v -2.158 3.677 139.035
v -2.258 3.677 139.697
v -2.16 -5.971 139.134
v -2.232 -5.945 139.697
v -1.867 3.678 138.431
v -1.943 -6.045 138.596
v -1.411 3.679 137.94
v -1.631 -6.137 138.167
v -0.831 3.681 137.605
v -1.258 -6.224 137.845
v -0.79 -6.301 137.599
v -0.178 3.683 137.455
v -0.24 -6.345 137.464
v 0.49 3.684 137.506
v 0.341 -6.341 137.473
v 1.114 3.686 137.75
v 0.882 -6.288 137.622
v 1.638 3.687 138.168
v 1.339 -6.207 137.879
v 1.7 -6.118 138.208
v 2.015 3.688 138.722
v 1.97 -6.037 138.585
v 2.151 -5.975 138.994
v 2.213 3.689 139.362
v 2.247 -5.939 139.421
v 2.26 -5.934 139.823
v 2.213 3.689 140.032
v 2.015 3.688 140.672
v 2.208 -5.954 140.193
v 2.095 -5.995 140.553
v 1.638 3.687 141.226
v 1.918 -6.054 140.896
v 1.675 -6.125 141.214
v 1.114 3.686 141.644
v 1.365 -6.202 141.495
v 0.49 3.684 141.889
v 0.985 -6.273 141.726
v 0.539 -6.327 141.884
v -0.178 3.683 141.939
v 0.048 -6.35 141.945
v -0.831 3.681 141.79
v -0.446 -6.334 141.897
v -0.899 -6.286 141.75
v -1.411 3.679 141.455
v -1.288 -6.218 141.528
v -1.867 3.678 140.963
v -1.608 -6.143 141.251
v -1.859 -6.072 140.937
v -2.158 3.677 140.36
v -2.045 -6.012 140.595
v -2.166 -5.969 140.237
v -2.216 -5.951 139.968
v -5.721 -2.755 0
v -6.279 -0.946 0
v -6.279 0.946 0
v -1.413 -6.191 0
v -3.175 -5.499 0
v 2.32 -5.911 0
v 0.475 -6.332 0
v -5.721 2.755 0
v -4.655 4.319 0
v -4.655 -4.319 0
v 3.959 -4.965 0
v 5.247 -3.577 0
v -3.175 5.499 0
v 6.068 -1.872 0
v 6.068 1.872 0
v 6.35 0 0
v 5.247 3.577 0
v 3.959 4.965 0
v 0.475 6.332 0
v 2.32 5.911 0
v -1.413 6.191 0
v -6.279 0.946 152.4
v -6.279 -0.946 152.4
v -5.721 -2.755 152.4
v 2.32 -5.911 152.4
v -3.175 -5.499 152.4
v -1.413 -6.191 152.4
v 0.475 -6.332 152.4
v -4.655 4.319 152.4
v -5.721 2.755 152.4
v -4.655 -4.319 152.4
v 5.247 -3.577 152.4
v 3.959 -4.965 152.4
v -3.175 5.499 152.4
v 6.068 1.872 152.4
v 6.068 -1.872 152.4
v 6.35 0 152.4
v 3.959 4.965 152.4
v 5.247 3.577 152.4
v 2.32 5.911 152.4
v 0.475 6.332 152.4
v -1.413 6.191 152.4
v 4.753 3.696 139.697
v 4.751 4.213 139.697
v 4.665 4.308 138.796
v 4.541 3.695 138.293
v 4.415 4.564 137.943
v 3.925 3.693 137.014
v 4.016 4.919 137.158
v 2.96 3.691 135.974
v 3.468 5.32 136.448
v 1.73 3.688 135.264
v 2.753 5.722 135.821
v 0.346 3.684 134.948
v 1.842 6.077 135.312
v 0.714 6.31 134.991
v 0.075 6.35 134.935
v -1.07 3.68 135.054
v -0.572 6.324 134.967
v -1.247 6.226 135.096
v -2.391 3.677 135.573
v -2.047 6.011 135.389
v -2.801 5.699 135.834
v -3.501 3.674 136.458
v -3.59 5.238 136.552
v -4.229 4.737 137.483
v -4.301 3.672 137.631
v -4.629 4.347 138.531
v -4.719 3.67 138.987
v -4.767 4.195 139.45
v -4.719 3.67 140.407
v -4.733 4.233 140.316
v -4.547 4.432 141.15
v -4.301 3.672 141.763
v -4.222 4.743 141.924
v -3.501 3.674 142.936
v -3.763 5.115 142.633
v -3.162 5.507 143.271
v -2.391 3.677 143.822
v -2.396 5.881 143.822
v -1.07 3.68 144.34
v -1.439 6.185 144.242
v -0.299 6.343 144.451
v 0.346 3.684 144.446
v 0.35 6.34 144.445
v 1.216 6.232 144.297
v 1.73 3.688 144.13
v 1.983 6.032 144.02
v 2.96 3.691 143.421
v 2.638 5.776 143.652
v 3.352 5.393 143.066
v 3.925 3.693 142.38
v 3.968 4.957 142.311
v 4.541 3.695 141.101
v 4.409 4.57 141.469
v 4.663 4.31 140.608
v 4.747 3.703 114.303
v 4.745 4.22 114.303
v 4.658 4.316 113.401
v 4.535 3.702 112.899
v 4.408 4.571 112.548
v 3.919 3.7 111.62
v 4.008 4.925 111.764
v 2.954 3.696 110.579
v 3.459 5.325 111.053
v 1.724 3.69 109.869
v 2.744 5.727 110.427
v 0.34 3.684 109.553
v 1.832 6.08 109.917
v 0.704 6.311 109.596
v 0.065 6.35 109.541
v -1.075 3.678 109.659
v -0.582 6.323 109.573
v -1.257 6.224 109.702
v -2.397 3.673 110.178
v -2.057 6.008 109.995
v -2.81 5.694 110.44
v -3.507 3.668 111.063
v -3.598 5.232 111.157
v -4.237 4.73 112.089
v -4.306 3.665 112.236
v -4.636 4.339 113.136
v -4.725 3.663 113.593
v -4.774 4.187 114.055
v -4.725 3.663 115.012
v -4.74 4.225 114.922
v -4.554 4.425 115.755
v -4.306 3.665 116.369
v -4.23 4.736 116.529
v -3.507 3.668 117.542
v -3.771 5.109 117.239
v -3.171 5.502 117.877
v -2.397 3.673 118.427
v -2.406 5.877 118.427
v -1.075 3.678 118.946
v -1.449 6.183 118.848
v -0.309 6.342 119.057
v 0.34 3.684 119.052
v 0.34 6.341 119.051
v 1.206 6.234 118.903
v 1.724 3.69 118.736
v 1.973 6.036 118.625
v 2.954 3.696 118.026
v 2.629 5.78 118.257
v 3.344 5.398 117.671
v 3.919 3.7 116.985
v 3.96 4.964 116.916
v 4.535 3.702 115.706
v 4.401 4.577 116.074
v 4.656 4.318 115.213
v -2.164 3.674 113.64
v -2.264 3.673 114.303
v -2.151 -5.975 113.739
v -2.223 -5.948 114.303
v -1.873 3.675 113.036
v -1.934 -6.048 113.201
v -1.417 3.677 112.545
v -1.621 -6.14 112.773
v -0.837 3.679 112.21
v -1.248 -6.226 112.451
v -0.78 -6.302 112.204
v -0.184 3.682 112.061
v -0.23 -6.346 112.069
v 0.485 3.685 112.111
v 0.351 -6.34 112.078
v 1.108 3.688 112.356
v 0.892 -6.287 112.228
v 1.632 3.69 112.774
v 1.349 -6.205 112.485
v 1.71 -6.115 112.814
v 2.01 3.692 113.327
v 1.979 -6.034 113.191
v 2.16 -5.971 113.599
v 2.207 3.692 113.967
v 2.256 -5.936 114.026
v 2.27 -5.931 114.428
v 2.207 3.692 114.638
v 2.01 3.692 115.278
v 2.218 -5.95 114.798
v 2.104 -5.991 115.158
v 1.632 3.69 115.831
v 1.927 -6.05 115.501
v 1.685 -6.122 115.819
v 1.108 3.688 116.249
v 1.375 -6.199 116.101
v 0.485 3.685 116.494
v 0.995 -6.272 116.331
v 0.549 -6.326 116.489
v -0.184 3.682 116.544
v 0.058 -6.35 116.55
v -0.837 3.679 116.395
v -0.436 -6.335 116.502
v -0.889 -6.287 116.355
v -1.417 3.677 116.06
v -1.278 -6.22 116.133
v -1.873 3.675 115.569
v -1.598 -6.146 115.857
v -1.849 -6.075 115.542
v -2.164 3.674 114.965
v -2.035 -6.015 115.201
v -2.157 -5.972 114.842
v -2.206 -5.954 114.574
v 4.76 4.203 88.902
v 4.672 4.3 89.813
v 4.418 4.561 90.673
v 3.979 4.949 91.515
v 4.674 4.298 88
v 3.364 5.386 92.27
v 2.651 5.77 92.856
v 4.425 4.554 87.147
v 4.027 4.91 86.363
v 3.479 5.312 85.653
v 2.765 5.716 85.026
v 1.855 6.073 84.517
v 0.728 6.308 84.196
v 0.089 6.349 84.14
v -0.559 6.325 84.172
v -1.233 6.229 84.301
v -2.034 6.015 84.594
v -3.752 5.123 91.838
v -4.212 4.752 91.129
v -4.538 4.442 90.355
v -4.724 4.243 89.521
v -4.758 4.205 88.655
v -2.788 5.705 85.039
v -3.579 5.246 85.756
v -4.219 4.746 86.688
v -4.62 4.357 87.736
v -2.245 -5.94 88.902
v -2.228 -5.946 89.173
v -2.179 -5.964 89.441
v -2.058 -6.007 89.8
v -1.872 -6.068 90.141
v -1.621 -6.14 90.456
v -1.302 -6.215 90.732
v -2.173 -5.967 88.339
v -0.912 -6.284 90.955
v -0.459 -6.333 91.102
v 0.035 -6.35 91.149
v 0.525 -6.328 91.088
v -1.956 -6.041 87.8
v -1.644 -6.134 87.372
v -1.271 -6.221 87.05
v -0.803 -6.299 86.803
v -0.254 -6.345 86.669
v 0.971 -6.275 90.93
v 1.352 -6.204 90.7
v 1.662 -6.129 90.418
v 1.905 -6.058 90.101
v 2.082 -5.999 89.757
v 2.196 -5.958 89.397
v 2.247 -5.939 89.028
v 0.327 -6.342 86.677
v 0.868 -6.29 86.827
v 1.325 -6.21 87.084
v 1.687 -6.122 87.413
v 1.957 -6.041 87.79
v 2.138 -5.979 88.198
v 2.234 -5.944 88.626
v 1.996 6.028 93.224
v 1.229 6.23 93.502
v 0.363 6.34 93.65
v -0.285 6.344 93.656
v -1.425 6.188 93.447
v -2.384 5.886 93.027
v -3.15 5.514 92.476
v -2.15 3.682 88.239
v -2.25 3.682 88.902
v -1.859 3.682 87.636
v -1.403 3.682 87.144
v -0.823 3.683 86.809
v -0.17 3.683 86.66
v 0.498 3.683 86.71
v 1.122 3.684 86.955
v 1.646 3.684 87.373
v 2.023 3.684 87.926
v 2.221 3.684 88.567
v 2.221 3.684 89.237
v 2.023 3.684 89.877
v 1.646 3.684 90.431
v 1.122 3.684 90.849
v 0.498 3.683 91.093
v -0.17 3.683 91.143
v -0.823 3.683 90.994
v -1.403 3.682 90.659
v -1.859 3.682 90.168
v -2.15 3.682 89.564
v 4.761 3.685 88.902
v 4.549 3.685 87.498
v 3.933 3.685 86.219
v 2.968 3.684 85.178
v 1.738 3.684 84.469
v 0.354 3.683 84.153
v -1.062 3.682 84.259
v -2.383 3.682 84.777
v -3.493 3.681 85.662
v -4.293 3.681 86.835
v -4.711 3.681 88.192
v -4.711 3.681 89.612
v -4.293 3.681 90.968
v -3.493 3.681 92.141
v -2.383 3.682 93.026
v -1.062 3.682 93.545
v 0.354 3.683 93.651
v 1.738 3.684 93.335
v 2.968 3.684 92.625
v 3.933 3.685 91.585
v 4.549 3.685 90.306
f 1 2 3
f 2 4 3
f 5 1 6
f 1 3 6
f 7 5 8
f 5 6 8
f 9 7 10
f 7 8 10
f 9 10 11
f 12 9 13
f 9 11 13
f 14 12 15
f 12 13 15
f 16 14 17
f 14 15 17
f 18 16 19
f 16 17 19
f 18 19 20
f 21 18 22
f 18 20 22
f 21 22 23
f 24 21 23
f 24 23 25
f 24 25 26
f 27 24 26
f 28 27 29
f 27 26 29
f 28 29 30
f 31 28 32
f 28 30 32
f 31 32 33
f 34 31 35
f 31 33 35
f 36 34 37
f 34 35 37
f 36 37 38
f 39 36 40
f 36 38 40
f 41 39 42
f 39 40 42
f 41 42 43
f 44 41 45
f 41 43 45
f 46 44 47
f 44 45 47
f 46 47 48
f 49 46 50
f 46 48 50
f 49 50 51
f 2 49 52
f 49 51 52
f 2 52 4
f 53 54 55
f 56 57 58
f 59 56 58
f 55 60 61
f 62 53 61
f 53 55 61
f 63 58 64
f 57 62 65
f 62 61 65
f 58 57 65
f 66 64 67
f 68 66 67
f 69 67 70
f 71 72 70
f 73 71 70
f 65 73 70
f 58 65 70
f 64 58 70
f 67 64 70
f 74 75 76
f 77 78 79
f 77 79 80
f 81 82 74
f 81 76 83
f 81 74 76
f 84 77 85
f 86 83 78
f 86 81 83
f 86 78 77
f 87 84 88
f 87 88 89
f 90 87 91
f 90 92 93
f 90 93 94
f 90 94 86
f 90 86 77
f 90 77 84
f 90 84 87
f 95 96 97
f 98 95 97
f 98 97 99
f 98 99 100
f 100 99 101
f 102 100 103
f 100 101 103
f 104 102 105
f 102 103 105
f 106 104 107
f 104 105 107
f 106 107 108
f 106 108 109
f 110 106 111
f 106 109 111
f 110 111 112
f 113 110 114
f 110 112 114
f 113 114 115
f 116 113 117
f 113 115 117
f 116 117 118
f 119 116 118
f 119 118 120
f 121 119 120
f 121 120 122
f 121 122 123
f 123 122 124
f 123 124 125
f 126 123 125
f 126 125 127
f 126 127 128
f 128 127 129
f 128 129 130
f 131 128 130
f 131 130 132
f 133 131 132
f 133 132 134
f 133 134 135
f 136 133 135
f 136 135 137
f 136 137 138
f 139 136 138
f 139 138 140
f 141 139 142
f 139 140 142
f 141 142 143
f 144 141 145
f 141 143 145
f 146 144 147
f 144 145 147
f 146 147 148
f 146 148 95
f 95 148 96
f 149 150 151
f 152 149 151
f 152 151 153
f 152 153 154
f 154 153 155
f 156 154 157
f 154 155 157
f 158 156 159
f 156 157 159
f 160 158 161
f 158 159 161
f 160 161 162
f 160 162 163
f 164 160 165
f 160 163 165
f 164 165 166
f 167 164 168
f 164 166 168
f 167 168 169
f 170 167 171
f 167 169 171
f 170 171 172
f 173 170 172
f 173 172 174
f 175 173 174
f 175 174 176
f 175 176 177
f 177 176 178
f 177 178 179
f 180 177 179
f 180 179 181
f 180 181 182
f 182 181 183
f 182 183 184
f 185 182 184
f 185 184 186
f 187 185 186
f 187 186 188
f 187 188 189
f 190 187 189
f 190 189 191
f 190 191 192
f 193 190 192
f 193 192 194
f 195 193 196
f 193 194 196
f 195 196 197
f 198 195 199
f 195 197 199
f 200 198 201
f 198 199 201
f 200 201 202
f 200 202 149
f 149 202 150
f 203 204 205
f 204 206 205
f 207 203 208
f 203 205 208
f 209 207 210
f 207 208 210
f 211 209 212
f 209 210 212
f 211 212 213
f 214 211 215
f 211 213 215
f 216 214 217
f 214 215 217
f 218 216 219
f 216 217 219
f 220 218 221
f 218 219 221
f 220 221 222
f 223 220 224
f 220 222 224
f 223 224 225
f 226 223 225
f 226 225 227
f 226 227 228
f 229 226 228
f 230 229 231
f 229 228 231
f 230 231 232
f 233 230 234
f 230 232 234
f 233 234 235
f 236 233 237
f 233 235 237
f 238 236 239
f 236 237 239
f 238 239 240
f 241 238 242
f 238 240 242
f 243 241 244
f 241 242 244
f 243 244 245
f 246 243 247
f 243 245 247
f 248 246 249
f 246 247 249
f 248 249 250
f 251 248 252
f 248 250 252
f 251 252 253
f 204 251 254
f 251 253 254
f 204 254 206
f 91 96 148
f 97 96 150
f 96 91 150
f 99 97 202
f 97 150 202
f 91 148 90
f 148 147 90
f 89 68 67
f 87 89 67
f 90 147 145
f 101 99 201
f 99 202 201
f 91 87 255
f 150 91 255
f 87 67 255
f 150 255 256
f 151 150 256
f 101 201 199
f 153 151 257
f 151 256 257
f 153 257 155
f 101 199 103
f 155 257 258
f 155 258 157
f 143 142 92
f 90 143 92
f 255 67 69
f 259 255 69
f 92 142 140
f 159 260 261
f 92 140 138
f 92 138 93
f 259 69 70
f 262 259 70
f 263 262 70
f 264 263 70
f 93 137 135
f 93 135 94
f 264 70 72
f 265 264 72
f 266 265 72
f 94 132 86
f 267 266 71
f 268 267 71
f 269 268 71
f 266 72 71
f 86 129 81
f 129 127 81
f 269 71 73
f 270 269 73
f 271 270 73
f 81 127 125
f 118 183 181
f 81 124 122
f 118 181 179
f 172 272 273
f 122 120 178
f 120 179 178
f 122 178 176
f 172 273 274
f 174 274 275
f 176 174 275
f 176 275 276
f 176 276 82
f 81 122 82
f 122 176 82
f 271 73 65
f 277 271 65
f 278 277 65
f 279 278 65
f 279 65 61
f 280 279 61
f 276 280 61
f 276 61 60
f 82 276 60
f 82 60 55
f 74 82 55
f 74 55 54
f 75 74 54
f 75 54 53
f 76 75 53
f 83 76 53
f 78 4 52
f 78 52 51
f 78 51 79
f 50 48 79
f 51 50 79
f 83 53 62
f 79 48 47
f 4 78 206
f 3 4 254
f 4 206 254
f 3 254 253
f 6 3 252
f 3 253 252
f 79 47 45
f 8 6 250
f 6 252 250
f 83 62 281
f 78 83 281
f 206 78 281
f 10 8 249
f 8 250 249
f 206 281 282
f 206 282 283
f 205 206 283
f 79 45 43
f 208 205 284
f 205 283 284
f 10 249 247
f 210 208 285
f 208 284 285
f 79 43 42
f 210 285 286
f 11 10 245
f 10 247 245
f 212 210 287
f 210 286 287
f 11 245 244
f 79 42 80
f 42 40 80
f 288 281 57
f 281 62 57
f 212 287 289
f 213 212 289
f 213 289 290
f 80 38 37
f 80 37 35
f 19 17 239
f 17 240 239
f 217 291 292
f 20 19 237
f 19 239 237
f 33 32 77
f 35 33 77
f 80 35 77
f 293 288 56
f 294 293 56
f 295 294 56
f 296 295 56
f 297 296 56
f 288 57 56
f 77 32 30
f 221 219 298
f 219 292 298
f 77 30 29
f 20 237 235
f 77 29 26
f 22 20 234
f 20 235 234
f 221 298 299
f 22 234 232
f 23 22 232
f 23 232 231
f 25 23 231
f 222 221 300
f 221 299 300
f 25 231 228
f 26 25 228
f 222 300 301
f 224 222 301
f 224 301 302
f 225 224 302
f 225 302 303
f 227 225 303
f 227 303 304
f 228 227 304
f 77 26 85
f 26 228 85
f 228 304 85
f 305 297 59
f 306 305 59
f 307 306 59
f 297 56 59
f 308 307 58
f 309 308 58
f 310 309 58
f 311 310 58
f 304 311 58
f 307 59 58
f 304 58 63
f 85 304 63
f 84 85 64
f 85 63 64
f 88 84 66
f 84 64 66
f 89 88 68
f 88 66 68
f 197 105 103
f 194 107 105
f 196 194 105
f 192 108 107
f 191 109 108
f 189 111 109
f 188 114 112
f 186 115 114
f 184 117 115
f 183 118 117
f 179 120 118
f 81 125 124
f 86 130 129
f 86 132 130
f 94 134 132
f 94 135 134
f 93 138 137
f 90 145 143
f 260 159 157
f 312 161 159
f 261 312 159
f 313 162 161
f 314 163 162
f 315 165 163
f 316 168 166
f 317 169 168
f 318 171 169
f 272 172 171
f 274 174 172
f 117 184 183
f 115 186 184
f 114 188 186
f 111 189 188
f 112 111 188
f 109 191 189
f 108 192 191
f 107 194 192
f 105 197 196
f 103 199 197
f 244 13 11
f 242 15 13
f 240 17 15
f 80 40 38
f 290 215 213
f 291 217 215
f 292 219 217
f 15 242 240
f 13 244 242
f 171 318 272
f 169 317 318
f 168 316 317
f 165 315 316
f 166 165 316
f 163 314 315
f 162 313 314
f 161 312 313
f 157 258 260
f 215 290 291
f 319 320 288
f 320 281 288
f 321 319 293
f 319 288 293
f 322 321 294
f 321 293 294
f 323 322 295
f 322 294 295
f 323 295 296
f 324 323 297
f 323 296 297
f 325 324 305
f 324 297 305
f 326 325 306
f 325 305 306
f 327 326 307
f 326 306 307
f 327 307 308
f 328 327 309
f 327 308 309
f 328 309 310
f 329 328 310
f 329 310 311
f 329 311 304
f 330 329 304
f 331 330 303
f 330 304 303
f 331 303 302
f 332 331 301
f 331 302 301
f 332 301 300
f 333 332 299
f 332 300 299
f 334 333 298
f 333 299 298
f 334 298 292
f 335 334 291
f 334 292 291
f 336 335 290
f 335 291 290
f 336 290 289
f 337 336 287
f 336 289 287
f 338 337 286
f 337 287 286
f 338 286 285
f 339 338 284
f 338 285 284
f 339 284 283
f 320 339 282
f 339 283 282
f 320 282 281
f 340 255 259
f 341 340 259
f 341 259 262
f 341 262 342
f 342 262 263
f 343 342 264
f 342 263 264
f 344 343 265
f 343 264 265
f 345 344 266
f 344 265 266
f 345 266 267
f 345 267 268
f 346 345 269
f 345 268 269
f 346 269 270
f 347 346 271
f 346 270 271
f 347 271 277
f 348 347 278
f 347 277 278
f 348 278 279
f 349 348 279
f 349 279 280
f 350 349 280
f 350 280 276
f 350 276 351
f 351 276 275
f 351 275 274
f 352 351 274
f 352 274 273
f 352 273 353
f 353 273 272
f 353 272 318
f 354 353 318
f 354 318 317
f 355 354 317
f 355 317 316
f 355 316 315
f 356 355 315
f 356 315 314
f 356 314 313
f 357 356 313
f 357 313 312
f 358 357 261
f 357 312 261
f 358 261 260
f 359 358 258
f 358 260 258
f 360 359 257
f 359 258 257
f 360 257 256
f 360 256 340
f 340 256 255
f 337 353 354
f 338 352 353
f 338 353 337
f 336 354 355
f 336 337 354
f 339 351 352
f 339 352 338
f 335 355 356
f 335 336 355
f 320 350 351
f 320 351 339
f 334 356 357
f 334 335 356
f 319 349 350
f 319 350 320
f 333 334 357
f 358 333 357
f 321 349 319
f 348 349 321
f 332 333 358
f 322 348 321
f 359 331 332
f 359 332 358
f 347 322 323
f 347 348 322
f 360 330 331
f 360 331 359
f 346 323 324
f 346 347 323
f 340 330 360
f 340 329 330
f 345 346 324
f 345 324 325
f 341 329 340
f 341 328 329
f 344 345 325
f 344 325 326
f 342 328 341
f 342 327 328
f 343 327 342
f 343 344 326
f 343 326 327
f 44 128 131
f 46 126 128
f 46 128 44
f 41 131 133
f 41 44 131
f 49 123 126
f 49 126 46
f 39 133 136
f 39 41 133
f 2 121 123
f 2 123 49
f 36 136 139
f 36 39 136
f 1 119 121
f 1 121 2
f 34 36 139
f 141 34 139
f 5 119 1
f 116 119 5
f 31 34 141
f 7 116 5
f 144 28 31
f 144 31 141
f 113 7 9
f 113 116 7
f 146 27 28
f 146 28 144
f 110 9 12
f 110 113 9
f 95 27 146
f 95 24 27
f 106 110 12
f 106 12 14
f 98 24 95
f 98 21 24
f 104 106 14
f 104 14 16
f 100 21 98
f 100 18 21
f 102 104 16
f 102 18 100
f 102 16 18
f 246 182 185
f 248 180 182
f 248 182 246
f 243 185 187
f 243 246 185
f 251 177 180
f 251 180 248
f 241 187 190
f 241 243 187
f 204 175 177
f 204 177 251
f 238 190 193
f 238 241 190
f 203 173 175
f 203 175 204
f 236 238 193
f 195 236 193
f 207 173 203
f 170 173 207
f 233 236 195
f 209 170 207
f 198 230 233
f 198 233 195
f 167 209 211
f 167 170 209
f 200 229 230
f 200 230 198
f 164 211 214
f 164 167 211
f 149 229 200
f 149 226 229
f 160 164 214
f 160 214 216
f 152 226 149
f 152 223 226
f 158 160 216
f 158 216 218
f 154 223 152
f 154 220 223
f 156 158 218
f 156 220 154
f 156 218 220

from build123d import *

# Parameters (mm, degrees)
SKETCH1_R                                           = 6.35
BOSS_EXTRUDE1_DEPTH                                 = 152.4
CBORE_FOR_8_BINDING_HEAD_MACHINE_SCREW1_D           = 4.4958
CBORE_FOR_8_BINDING_HEAD_MACHINE_SCREW1_CBORE_D     = 9.525
CBORE_FOR_8_BINDING_HEAD_MACHINE_SCREW1_CBORE_DEPTH = 2.667
CBORE_FOR_8_BINDING_HEAD_MACHINE_SC_2_D             = 4.4958
CBORE_FOR_8_BINDING_HEAD_MACHINE_SC_2_CBORE_D       = 9.525
CBORE_FOR_8_BINDING_HEAD_MACHINE_SC_2_CBORE_DEPTH   = 2.667
CBORE_FOR_8_BINDING_HEAD_MACHINE_SC_3_D             = 4.4958
CBORE_FOR_8_BINDING_HEAD_MACHINE_SC_3_CBORE_D       = 9.525
CBORE_FOR_8_BINDING_HEAD_MACHINE_SC_3_CBORE_DEPTH   = 2.667


with BuildPart() as part:
    # Sketch1 → Boss-Extrude1 (new body)
    with BuildSketch(Plane.XY):
        Circle(SKETCH1_R)
    extrude(amount=BOSS_EXTRUDE1_DEPTH)

    # CBORE for #8 Binding Head Machine Screw1 (through all)
    with Locations(Plane(origin=(-0.016915507, 6.34997747, 139.69710088), x_dir=(0.999996452, 0.002663859, 0), z_dir=(-0.002663859, 0.999996452, 0))):
        with Locations((0, 0)):
            CounterBoreHole(CBORE_FOR_8_BINDING_HEAD_MACHINE_SCREW1_D / 2, CBORE_FOR_8_BINDING_HEAD_MACHINE_SCREW1_CBORE_D / 2, CBORE_FOR_8_BINDING_HEAD_MACHINE_SCREW1_CBORE_DEPTH)

    # CBORE for _8 Binding Head Machine Sc 2 (through all)
    with Locations(Plane(origin=(-0.027009151, 6.349942559, 114.302510667), x_dir=(0.999990956, 0.004253, 0), z_dir=(-0.004253, 0.999990956, 0))):
        with Locations((0, 0)):
            CounterBoreHole(CBORE_FOR_8_BINDING_HEAD_MACHINE_SC_2_D / 2, CBORE_FOR_8_BINDING_HEAD_MACHINE_SC_2_CBORE_D / 2, CBORE_FOR_8_BINDING_HEAD_MACHINE_SC_2_CBORE_DEPTH)

    # CBORE for _8 Binding Head Machine Sc 3 (through all)
    with Locations(Plane(origin=(-0.003205304, 6.349999191, 88.90178774), x_dir=(0.999999872, 0.000505, 0), z_dir=(-0.000505, 0.999999872, 0))):
        with Locations((0, 0)):
            CounterBoreHole(CBORE_FOR_8_BINDING_HEAD_MACHINE_SC_3_D / 2, CBORE_FOR_8_BINDING_HEAD_MACHINE_SC_3_CBORE_D / 2, CBORE_FOR_8_BINDING_HEAD_MACHINE_SC_3_CBORE_DEPTH)


solid = part.part
